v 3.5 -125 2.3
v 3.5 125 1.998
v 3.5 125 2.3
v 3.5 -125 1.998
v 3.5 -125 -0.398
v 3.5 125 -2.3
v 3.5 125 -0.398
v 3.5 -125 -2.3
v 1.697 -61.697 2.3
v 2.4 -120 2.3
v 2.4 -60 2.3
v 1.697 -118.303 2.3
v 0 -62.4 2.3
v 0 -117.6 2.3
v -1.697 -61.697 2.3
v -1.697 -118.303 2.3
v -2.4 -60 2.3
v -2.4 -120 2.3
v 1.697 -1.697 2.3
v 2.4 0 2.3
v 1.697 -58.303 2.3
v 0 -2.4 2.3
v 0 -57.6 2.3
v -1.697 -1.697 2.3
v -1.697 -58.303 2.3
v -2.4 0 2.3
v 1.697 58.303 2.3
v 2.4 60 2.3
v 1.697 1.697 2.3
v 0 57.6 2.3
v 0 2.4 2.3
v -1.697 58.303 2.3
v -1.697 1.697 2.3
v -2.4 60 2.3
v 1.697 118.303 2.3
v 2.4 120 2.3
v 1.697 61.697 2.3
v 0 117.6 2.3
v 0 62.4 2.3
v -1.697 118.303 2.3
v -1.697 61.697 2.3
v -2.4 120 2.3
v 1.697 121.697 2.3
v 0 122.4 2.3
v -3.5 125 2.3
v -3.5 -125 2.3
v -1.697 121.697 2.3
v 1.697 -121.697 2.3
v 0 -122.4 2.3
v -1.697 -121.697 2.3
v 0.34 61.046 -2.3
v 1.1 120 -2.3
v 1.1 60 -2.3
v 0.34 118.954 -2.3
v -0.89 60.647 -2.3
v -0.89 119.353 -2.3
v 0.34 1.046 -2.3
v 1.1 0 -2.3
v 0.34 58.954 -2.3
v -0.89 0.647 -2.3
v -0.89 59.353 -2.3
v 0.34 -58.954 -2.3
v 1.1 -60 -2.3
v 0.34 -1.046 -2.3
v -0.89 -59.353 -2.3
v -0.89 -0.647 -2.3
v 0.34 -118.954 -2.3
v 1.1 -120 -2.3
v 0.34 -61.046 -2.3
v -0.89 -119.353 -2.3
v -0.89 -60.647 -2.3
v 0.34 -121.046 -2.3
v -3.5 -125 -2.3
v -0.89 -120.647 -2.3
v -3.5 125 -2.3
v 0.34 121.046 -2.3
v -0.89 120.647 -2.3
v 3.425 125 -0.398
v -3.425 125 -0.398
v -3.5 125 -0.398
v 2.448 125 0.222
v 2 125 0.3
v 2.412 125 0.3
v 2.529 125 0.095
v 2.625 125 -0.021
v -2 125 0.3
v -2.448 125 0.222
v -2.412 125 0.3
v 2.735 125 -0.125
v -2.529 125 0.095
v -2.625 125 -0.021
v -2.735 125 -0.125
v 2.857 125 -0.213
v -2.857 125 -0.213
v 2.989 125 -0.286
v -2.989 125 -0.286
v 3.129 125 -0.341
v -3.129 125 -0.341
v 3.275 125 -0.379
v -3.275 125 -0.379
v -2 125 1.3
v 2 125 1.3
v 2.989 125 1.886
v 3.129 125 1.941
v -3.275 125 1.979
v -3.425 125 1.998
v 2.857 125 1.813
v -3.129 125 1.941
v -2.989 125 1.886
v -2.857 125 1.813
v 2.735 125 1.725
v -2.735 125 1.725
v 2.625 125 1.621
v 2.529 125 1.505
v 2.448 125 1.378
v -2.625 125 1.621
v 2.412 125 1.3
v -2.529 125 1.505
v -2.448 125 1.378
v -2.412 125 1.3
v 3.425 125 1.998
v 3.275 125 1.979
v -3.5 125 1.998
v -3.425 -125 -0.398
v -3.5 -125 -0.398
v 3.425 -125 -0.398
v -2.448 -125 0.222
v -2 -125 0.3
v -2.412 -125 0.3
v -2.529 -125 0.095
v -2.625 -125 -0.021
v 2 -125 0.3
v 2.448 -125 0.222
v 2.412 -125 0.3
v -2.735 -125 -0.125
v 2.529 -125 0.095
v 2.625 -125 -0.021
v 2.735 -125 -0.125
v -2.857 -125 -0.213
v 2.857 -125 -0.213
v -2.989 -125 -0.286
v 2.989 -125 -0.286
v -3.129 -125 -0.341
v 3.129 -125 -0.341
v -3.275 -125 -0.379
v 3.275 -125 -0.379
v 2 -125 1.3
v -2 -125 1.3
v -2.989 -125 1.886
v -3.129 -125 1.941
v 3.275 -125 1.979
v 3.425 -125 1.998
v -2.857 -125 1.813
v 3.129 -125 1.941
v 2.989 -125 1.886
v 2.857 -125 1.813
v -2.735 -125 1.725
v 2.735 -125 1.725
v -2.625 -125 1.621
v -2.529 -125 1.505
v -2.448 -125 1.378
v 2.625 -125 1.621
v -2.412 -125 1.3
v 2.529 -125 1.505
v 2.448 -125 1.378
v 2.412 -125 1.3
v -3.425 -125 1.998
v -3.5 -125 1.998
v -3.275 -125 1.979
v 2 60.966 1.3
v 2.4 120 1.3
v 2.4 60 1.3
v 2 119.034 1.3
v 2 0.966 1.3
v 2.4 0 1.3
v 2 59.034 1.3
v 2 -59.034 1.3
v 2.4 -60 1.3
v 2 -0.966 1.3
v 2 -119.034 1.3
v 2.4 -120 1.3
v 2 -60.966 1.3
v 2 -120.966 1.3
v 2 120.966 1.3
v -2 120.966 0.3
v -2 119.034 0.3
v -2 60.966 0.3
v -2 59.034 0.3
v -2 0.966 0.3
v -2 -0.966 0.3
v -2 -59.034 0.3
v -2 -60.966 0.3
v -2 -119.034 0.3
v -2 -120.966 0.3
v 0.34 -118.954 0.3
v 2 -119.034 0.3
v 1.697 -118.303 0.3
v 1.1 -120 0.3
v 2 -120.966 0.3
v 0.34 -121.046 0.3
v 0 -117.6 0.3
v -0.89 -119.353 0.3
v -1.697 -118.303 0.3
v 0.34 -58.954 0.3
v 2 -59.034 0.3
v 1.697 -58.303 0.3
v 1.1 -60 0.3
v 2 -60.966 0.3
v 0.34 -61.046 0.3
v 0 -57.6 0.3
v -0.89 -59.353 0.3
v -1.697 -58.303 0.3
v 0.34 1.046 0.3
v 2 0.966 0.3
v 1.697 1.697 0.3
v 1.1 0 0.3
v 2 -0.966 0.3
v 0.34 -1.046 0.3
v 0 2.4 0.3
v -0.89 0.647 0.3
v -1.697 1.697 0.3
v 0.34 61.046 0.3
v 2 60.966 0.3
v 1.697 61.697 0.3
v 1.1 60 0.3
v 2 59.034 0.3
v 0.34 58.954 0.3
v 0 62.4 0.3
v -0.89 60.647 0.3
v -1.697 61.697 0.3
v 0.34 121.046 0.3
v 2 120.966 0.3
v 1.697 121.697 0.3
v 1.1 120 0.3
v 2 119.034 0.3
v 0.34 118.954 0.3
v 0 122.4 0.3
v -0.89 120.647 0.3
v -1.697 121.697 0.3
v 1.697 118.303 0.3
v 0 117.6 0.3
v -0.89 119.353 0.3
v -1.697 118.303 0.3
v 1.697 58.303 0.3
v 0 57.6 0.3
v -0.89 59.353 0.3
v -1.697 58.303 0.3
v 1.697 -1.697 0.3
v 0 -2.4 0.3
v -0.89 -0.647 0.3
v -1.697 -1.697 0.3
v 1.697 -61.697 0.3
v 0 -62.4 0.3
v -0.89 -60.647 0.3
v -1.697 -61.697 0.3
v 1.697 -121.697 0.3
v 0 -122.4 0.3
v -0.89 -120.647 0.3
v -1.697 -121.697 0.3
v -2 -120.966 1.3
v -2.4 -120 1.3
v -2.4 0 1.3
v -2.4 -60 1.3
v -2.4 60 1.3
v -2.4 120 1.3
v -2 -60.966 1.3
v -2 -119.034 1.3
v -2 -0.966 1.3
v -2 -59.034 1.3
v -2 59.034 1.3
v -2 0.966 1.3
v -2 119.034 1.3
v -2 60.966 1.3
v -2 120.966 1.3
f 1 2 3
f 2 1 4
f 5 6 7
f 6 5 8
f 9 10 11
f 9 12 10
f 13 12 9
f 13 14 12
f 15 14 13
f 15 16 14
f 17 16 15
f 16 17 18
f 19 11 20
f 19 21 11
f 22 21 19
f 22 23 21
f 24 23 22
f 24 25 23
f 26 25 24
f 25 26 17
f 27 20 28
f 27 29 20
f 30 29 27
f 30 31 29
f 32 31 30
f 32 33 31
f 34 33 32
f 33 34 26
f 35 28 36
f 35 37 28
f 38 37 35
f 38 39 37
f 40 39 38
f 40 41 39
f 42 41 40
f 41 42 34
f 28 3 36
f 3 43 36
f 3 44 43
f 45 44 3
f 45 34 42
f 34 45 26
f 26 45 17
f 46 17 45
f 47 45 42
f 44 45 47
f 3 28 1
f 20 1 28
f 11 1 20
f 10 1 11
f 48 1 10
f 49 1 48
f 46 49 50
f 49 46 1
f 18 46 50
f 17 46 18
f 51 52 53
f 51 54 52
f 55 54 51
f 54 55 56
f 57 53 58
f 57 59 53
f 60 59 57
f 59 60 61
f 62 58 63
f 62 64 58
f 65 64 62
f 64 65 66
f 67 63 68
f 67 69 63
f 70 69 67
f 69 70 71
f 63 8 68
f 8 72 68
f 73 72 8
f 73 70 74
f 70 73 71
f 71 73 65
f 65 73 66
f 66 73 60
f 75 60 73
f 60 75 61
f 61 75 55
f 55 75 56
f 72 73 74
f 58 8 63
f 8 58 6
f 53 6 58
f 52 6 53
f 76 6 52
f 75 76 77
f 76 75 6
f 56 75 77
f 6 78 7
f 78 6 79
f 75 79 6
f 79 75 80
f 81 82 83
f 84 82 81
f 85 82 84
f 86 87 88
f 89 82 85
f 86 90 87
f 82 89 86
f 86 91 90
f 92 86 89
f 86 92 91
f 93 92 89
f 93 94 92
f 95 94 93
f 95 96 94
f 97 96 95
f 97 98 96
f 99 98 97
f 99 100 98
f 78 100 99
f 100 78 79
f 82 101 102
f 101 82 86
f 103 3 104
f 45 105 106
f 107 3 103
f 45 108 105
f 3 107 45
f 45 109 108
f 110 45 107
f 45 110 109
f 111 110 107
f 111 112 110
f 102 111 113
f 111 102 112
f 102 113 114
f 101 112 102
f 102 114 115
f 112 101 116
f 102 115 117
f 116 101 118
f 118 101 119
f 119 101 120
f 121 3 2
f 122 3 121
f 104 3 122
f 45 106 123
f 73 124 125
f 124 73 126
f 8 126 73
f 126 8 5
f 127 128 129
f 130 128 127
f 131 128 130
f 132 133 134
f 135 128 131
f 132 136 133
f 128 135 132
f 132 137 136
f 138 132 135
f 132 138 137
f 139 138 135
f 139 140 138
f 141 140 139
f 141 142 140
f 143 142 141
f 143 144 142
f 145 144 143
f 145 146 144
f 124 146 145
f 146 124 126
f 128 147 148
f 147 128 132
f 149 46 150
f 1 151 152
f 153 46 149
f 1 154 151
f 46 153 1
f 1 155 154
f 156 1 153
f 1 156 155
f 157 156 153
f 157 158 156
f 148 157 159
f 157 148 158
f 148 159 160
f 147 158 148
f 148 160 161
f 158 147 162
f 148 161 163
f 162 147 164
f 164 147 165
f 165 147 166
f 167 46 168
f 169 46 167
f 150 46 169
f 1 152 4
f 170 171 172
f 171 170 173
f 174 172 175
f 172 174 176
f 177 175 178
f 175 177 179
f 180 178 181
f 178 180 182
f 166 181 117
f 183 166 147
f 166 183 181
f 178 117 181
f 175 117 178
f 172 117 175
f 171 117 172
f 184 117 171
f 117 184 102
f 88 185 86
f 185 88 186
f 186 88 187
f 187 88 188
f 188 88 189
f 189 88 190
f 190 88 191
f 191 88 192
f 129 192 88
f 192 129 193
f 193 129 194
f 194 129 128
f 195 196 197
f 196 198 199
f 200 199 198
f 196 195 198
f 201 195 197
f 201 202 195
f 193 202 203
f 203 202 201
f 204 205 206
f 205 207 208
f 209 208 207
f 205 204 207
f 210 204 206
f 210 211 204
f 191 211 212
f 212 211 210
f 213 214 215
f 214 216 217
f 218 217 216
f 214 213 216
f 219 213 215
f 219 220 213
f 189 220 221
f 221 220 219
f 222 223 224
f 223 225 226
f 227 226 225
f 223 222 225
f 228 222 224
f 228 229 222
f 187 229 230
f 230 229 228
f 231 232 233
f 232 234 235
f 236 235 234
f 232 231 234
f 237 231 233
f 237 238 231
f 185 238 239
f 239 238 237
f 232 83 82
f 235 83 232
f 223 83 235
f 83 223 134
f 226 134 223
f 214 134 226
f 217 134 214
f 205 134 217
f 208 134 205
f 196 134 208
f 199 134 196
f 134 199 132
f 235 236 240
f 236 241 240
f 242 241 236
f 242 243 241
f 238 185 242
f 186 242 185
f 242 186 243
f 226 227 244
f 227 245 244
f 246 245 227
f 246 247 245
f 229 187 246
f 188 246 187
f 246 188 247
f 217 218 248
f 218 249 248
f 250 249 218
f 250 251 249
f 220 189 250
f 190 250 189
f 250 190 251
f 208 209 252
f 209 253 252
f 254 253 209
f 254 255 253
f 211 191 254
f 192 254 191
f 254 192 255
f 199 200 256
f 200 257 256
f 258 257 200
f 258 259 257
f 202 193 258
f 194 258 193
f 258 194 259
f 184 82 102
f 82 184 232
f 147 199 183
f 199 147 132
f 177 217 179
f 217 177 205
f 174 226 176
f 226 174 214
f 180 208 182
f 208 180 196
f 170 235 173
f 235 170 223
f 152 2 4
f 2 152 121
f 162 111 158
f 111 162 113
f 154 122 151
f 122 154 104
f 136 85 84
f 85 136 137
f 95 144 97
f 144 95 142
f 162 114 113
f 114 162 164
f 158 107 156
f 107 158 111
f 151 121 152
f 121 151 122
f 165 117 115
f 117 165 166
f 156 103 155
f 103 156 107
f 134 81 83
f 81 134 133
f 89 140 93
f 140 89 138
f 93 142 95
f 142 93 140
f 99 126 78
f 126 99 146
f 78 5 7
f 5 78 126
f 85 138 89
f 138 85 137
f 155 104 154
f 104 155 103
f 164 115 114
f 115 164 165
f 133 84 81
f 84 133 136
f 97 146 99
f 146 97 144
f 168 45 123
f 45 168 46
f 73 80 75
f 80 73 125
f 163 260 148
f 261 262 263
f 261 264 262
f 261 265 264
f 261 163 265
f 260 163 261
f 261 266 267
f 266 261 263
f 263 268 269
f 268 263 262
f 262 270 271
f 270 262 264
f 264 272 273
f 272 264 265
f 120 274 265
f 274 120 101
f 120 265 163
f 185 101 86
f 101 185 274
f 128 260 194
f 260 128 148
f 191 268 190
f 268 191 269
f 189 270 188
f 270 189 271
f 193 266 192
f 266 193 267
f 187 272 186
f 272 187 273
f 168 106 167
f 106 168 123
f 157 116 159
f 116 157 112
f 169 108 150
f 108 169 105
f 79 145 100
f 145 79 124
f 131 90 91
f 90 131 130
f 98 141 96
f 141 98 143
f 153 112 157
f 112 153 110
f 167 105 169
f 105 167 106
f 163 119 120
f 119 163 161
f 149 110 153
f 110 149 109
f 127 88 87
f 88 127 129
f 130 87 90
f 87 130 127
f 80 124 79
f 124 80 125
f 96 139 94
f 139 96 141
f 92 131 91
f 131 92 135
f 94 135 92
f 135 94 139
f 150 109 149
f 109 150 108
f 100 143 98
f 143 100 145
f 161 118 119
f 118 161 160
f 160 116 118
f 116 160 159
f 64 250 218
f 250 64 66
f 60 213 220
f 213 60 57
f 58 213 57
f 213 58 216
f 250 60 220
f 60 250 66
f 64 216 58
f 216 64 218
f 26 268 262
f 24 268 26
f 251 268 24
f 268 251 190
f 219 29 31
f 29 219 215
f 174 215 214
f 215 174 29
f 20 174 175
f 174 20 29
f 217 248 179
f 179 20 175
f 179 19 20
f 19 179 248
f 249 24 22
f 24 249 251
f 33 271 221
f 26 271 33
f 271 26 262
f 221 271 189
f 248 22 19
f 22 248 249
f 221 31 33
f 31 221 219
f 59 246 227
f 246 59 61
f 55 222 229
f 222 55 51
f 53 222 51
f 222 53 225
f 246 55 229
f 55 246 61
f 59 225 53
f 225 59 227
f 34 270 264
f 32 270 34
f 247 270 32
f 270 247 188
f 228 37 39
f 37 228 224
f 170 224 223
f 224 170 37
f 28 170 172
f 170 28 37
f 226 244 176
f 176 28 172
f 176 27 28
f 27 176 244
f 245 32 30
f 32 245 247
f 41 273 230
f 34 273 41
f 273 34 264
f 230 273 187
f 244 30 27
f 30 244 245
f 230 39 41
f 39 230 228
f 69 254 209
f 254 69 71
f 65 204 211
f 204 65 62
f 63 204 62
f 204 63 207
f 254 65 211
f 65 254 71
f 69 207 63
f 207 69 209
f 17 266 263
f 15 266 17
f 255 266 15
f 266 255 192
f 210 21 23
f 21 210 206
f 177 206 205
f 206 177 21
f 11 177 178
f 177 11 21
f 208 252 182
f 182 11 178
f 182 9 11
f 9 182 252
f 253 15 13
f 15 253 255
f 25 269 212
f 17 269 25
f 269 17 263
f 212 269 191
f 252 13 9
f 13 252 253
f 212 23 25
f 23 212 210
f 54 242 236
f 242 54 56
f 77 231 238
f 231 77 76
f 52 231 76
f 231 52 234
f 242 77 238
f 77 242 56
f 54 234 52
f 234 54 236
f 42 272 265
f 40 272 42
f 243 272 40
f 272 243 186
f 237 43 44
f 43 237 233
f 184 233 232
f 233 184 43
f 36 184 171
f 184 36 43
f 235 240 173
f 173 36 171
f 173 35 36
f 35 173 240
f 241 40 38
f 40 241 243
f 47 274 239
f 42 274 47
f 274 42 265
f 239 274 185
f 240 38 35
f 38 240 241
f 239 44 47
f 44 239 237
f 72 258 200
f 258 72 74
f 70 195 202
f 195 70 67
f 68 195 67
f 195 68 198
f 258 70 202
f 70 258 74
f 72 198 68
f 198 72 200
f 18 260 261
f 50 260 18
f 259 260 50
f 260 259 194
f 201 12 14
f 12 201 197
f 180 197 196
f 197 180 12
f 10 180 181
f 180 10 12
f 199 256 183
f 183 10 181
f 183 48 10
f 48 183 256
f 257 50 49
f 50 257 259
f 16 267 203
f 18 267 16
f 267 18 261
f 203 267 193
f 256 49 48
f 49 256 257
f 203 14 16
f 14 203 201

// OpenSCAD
/*
Common Guide Measurements, rrecently learnt about the scope variable, sad face.

All measurements in metric millimetres
*/

//If anyone knows of a guide to standardisation among sizings of linear guides and there carriages let me know so I can make this more accurate and add more options, would like to have the carriage generation as well eventually.

//Default Style (For custom measurements choose custom)
//type = "MGN7"; // [MGN12, MGN7, custom]


//Linear Rail Length
guideLength = 250;

//Guide Height
guideWidth = 7;

//Guide Height
guideHeight = 4.6;

//Ball Guide distance from top of the carriage
ballGuideTopDistance = 1.5;

//(spacing between holes not pitch)
holePitch = 60;

//Inner Hole Radius 
innerHoleDiameter = 1.1;

//Outer Hole Radius
outerHoleDiameter = 2.4;

//Depth of the top outer hole to the inner.
outerHoleDepth = 2;
 

module guideRail(){
    //Draw profile cube of width, length and height, cut cylinder and cube out for rollers then mirror on the x-axis.
        difference(){
            difference (){
                translate([guideWidth/4,0,0])
                cube([guideWidth/2, guideLength, guideHeight], true);
                    translate([guideWidth/2-1,0,guideHeight/2-ballGuideTopDistance])    cube([1,guideLength+1,1], true);
            };
            rotate(a = 90, v = [1,0,0]){
                translate([guideWidth/2,guideHeight/2-ballGuideTopDistance,0]){
                    cylinder(guideLength+2, 1.2, 1.2, $fn=50 ,true);
                }
            }
        };
    //mirror opposite side
    mirror([1,0,0]){
        difference(){
            difference (){
                translate([guideWidth/4,0,0])
                cube([guideWidth/2, guideLength, guideHeight], true);
                    translate([guideWidth/2-1,0,guideHeight/2-ballGuideTopDistance])    cube([1,guideLength+1,1], true);
            };
            rotate(a = 90, v = [1,0,0]){
                translate([guideWidth/2,guideHeight/2-ballGuideTopDistance,0]){
                    cylinder(guideLength+2, 1.2, 1.2, $fn=50 ,true);
                }
            }
        };
    }
}

module guideHoles(){
    

        for(a = [0:floor((guideLength/holePitch)/2)]){
            
            translate([0,(holePitch)*a,0]){
                union(){
                    cylinder(guideHeight+4, innerHoleDiameter,innerHoleDiameter, true);
                    translate([0,0,guideHeight-outerHoleDepth]){
                    cylinder(guideHeight, outerHoleDiameter, outerHoleDiameter, true);}
                }
            }
                        translate([0,-1*(holePitch)*a,0]){
                union(){
                    cylinder(guideHeight+4, innerHoleDiameter,innerHoleDiameter, true);
                    translate([0,0,guideHeight-outerHoleDepth]){
                    cylinder(guideHeight, outerHoleDiameter, outerHoleDiameter, true);}
                }
            }
        }
    }
    





difference(){
    guideRail();
    guideHoles();
}
